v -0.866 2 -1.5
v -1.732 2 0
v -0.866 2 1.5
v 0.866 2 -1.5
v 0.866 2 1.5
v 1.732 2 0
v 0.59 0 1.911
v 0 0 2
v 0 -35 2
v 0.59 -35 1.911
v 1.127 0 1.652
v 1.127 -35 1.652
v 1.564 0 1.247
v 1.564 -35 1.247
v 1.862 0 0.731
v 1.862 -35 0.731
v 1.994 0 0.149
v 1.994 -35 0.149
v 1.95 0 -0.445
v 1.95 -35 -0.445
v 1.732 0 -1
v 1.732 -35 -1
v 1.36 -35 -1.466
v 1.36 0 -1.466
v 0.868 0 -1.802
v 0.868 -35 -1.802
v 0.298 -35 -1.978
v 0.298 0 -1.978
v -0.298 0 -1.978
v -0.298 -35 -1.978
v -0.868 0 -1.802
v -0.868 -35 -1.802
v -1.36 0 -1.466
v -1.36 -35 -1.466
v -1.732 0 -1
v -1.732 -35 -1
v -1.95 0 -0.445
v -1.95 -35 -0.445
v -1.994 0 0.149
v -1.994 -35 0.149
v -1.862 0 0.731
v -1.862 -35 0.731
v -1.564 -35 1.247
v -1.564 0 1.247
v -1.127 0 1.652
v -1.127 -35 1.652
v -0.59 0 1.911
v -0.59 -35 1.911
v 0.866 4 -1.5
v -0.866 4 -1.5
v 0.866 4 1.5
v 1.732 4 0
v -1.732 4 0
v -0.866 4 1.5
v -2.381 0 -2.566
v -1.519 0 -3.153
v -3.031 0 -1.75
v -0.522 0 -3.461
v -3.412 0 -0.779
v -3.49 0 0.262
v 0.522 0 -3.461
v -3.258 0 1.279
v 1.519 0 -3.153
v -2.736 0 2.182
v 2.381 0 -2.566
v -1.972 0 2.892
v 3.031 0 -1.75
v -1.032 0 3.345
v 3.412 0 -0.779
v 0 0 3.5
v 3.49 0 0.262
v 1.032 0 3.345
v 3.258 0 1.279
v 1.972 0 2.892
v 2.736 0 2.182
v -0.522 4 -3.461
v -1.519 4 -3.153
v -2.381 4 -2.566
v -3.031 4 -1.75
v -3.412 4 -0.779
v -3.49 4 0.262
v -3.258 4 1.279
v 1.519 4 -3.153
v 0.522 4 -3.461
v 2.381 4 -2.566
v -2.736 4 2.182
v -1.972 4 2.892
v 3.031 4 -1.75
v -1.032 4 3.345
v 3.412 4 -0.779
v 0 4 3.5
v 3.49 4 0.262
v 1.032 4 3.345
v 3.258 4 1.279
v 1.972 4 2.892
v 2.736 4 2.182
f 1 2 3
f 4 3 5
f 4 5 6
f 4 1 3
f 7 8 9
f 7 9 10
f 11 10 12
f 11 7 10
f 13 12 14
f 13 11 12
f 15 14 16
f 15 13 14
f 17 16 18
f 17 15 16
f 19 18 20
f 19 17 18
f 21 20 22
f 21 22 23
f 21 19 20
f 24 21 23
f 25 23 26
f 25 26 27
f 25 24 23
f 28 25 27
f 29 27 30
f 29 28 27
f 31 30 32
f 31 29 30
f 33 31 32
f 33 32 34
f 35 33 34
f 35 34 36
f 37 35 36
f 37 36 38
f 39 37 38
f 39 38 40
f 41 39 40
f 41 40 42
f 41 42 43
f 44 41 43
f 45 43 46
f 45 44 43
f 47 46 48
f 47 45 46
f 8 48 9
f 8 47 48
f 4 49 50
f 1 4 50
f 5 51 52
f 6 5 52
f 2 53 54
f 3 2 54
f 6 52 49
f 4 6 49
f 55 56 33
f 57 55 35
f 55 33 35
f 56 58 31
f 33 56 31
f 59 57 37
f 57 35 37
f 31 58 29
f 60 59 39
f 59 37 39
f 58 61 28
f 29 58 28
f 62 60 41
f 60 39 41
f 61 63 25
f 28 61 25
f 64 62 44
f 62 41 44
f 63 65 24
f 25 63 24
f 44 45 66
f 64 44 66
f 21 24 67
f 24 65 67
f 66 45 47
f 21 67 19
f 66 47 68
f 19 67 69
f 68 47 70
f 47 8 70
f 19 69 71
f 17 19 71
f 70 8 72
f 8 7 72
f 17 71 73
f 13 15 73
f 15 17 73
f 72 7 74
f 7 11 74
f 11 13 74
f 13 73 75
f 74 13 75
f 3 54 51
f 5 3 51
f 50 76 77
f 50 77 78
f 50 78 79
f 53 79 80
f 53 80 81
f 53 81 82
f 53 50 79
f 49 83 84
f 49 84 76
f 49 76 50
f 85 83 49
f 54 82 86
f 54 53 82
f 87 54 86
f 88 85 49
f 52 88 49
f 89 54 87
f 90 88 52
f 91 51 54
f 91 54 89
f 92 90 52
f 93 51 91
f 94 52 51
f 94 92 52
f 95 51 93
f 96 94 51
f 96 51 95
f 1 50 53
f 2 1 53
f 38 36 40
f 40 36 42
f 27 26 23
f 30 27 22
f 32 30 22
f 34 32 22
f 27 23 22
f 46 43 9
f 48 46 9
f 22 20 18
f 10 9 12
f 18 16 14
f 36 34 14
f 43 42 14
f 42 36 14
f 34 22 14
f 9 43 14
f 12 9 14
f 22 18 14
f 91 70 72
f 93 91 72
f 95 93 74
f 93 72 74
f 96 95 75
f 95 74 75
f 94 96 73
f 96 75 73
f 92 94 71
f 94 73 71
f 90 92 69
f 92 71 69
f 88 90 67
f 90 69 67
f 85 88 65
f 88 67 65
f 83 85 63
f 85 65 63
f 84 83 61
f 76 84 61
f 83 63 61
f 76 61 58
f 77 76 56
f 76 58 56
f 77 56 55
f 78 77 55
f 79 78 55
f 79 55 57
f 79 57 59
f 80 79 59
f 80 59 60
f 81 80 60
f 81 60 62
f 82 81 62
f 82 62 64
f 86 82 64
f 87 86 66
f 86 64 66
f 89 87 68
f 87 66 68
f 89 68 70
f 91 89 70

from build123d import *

# Parameters (mm, degrees)
SKETCH_1_R          = 3.5
EXTRUDE_397_DEPTH   = 4
SKETCH_1_3_R        = 2
EXTRUDE_432_DEPTH   = 35
CUT_EXTRUDE_1_DEPTH = 2


with BuildPart() as part:
    # 草图1 → Extrude 397 (new body)
    with BuildSketch(Plane(origin=(0, 0, 0), x_dir=(1, 0, 0), z_dir=(0, 1, 0))):
        Circle(SKETCH_1_R)
    extrude(amount=EXTRUDE_397_DEPTH)

    # 草图1<3> → Extrude 432 (add)
    with BuildSketch(Plane(origin=(0, 0, 0), x_dir=(1, 0, 0), z_dir=(0, 1, 0))):
        Circle(SKETCH_1_3_R)
    extrude(amount=-EXTRUDE_432_DEPTH)

    # 草图2 → 切除-拉伸1 (cut)
    with BuildSketch(Plane(origin=(0, 4, 0), x_dir=(1, 0, 0), z_dir=(0, 1, 0))):
        Polygon((1.732050808, 0), (0.866025404, 1.5), (-0.866025404, 1.5), (-1.732050808, 0), (-0.866025404, -1.5), (0.866025404, -1.5), align=None)
    extrude(amount=-CUT_EXTRUDE_1_DEPTH, mode=Mode.SUBTRACT)


solid = part.part
